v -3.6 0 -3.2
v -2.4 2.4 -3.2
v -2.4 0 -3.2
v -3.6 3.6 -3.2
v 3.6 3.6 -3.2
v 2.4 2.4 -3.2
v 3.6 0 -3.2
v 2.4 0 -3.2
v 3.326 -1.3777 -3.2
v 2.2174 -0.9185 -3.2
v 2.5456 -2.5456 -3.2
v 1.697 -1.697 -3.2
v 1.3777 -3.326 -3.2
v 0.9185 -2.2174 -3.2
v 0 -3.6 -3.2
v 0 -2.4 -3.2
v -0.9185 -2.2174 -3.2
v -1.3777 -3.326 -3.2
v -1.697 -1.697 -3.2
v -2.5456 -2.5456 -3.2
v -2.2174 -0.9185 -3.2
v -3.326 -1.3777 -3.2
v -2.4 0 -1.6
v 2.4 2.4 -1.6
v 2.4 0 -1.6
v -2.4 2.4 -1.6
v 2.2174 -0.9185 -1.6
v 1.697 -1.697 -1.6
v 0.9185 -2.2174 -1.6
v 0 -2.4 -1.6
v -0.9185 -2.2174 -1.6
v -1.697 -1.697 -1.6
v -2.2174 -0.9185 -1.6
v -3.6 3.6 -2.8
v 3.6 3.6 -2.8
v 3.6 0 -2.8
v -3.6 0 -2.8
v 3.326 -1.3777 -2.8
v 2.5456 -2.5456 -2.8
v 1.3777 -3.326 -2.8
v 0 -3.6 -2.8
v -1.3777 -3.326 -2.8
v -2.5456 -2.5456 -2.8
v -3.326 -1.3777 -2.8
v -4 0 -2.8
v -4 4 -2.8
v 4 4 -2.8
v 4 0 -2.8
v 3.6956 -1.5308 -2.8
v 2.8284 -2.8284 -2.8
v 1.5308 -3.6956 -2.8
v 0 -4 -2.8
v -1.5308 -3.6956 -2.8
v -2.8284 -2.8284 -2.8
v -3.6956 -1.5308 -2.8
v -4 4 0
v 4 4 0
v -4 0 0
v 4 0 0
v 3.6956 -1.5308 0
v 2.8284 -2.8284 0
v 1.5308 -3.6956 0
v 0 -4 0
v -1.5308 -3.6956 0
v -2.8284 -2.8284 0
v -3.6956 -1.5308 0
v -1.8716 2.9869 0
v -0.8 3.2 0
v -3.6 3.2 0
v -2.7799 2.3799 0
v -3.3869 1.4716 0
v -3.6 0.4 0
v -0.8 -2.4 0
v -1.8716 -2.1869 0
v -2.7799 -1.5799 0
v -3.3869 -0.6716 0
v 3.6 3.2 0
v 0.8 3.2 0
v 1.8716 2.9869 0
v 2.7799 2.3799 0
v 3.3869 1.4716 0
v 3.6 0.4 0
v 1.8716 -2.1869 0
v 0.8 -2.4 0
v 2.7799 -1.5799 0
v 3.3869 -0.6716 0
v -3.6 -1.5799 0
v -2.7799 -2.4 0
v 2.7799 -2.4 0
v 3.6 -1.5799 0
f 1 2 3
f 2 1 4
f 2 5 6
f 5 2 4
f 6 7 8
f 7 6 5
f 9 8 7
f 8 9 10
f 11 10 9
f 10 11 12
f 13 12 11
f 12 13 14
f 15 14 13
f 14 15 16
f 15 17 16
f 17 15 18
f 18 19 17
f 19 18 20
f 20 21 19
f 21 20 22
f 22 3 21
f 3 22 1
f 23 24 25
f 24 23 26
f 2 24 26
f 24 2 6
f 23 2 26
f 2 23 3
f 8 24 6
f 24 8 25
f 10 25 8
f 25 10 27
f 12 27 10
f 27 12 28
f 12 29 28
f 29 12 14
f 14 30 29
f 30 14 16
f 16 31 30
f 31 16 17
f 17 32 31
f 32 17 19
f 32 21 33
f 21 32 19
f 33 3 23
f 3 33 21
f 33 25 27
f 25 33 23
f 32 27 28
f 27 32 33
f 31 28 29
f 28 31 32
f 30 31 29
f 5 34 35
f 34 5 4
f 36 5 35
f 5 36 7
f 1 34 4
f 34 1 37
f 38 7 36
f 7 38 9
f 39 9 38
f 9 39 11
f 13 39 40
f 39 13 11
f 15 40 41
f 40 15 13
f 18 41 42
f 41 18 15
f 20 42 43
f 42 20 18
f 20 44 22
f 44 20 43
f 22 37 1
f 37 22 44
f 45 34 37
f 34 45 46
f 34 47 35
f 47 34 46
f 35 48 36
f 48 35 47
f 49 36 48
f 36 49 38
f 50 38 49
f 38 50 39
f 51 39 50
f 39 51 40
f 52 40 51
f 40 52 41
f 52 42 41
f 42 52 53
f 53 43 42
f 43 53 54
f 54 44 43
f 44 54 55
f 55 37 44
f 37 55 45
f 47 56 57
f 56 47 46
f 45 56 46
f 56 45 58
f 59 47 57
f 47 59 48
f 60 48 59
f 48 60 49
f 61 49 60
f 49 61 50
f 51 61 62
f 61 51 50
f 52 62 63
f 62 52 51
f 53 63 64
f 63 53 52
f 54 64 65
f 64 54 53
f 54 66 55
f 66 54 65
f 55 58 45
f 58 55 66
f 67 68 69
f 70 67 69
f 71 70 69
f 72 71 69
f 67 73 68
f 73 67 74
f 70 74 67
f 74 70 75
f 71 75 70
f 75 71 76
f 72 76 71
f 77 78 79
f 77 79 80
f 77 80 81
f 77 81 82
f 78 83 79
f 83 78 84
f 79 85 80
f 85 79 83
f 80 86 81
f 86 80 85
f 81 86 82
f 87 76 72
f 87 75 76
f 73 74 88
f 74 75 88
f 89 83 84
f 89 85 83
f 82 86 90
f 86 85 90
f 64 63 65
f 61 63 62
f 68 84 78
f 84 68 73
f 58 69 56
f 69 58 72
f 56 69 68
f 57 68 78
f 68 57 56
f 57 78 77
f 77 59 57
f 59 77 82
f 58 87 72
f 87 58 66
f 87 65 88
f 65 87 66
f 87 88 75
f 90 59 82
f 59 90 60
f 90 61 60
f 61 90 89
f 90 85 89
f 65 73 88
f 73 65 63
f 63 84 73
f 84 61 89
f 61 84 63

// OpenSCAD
// file: ../p/2-4edge.scad
use <../lib.scad>
function ldraw_lib__2_4edge() = [
// 0 Circle 0.5
// 0 Name: 2-4edge.dat
// 0 Author: James Jessiman
// 0 !LDRAW_ORG Primitive UPDATE 2017-01
// 0 !LICENSE Licensed under CC BY 4.0 : see CAreadme.txt
// 
// 0 BFC CERTIFY CCW
  [0,"BFC","CERTIFY"],
  [0,"BFC","CCW"],
// 
// 0 !HISTORY 2007-06-24 [PTadmin] Header formatted for Contributor Agreement
// 0 !HISTORY 2008-07-01 [PTadmin] Official Update 2008-01
// 0 !HISTORY 2017-01-15 [Steffen] BFCed
// 0 !HISTORY 2017-12-30 [PTadmin] Official Update 2017-01
// 
// 
// 2 24 1 0 0 0.9239 0 0.3827
  [2,24,1,0,0,0.9239,0,0.3827],
// 2 24 0.9239 0 0.3827 0.7071 0 0.7071
  [2,24,0.9239,0,0.3827,0.7071,0,0.7071],
// 2 24 0.7071 0 0.7071 0.3827 0 0.9239
  [2,24,0.7071,0,0.7071,0.3827,0,0.9239],
// 2 24 0.3827 0 0.9239 0 0 1
  [2,24,0.3827,0,0.9239,0,0,1],
// 2 24 0 0 1 -0.3827 0 0.9239
  [2,24,0,0,1,-0.3827,0,0.9239],
// 2 24 -0.3827 0 0.9239 -0.7071 0 0.7071
  [2,24,-0.3827,0,0.9239,-0.7071,0,0.7071],
// 2 24 -0.7071 0 0.7071 -0.9239 0 0.3827
  [2,24,-0.7071,0,0.7071,-0.9239,0,0.3827],
// 2 24 -0.9239 0 0.3827 -1 0 0
  [2,24,-0.9239,0,0.3827,-1,0,0],
];
module ldraw_lib__2_4edge(step=0, col=false, unit=2/5, alt=false, line=0.2, solid=!$preview)
    makepoly(ldraw_lib__2_4edge(), step=step, col=col, unit=unit, alt=alt, line=line, solid=solid);
ldraw_lib__2_4edge(line=0.2);
// file: ../p/2-4cyli.scad
use <../lib.scad>
function ldraw_lib__2_4cyli() = [
// 0 Cylinder 0.5
// 0 Name: 2-4cyli.dat
// 0 Author: James Jessiman
// 0 !LDRAW_ORG Primitive UPDATE 2005-01
// 0 !LICENSE Licensed under CC BY 4.0 : see CAreadme.txt
// 
// 0 BFC CERTIFY CCW
  [0,"BFC","CERTIFY"],
  [0,"BFC","CCW"],
// 
// 0 !HISTORY 2002-03-23 [sbliss] Added BFC statement; compacted code
// 0 !HISTORY 2002-04-25 [PTadmin] Official Update 2002-02
// 0 !HISTORY 2004-12-11 [nielsk] Recreated using Primitive Generator, Edge lines fixed, BFC changed to CCW
// 0 !HISTORY 2005-12-28 [PTadmin] Official Update 2005-01
// 0 !HISTORY 2007-06-24 [PTadmin] Header formatted for Contributor Agreement
// 0 !HISTORY 2008-07-01 [PTadmin] Official Update 2008-01
// 
// 
// 4 16 .9239 1 .3827 .9239 0 .3827 1 0 0 1 1 0
  [4,16,.9239,1,.3827,.9239,0,.3827,1,0,0,1,1,0],
// 4 16 .7071 1 .7071 .7071 0 .7071 .9239 0 .3827 .9239 1 .3827
  [4,16,.7071,1,.7071,.7071,0,.7071,.9239,0,.3827,.9239,1,.3827],
// 4 16 .3827 1 .9239 .3827 0 .9239 .7071 0 .7071 .7071 1 .7071
  [4,16,.3827,1,.9239,.3827,0,.9239,.7071,0,.7071,.7071,1,.7071],
// 4 16 0 1 1 0 0 1 .3827 0 .9239 .3827 1 .9239
  [4,16,0,1,1,0,0,1,.3827,0,.9239,.3827,1,.9239],
// 4 16 -.3827 1 .9239 -.3827 0 .9239 0 0 1 0 1 1
  [4,16,-.3827,1,.9239,-.3827,0,.9239,0,0,1,0,1,1],
// 4 16 -.7071 1 .7071 -.7071 0 .7071 -.3827 0 .9239 -.3827 1 .9239
  [4,16,-.7071,1,.7071,-.7071,0,.7071,-.3827,0,.9239,-.3827,1,.9239],
// 4 16 -.9239 1 .3827 -.9239 0 .3827 -.7071 0 .7071 -.7071 1 .7071
  [4,16,-.9239,1,.3827,-.9239,0,.3827,-.7071,0,.7071,-.7071,1,.7071],
// 4 16 -1 1 0 -1 0 0 -.9239 0 .3827 -.9239 1 .3827
  [4,16,-1,1,0,-1,0,0,-.9239,0,.3827,-.9239,1,.3827],
// 5 24 1 1 0 1 0 0 1 1 -.4142 .9239 1 .3827
  [5,24,1,1,0,1,0,0,1,1,-.4142,.9239,1,.3827],
// 5 24 .9239 1 .3827 .9239 0 .3827 1 1 0 .7071 1 .7071
  [5,24,.9239,1,.3827,.9239,0,.3827,1,1,0,.7071,1,.7071],
// 5 24 .7071 1 .7071 .7071 0 .7071 .9239 1 .3827 .3827 1 .9239
  [5,24,.7071,1,.7071,.7071,0,.7071,.9239,1,.3827,.3827,1,.9239],
// 5 24 .3827 1 .9239 .3827 0 .9239 .7071 1 .7071 0 1 1
  [5,24,.3827,1,.9239,.3827,0,.9239,.7071,1,.7071,0,1,1],
// 5 24 0 1 1 0 0 1 .3827 1 .9239 -.3827 1 .9239
  [5,24,0,1,1,0,0,1,.3827,1,.9239,-.3827,1,.9239],
// 5 24 -.3827 1 .9239 -.3827 0 .9239 0 1 1 -.7071 1 .7071
  [5,24,-.3827,1,.9239,-.3827,0,.9239,0,1,1,-.7071,1,.7071],
// 5 24 -.7071 1 .7071 -.7071 0 .7071 -.3827 1 .9239 -.9239 1 .3827
  [5,24,-.7071,1,.7071,-.7071,0,.7071,-.3827,1,.9239,-.9239,1,.3827],
// 5 24 -.9239 1 .3827 -.9239 0 .3827 -.7071 1 .7071 -1 1 0
  [5,24,-.9239,1,.3827,-.9239,0,.3827,-.7071,1,.7071,-1,1,0],
// 5 24 -1 1 0 -1 0 0 -.9239 1 .3827 -1 1 -.4142
  [5,24,-1,1,0,-1,0,0,-.9239,1,.3827,-1,1,-.4142],
// 0
];
module ldraw_lib__2_4cyli(step=0, col=false, unit=2/5, alt=false, line=0.2, solid=!$preview)
    makepoly(ldraw_lib__2_4cyli(), step=step, col=col, unit=unit, alt=alt, line=line, solid=solid);
ldraw_lib__2_4cyli(line=0.2);
// file: ../p/empty.scad
use <../lib.scad>
function ldraw_lib__empty() = [
// 0 Empty
// 0 Name: empty.dat
// 0 Author: Steffen [Steffen]
// 0 !LDRAW_ORG Primitive UPDATE 2025-08
// 0 !LICENSE Licensed under CC BY 4.0 : see CAreadme.txt
// 
// 0 BFC CERTIFY CCW
  [0,"BFC","CERTIFY"],
  [0,"BFC","CCW"],
// 
// 0 !HISTORY 2015-10-11 [PTadmin] Official Update 2015-01
// 0 !HISTORY 2025-08-13 [OrionP] Fix comments
// 0 !HISTORY 2025-08-31 [OrionP] Official Update 2025-08
// 
// 0 // Tool MLCad cannot handle really empty files. This file is used as a workaround.
// 0 // It exceptionally contains forbidden non-LDRAW standard syntax to satisfy MLCad
// 0 // until it is fixed OR a different editor has become the de-facto LDRAW standard.
// 0 // The line being used here is an "impossible" conditional line which never should be visible,
// 0 // additionally hidden by a syntax explicitly hiding it from displaying.
// 
// 0 MLCAD HIDE 5 24 0 0 0 0.0001 0 0 0.0001 -0.0001 0 0 0 0
];
module ldraw_lib__empty(step=0, col=false, unit=2/5, alt=false, line=0.2, solid=!$preview)
    makepoly(ldraw_lib__empty(), step=step, col=col, unit=unit, alt=alt, line=line, solid=solid);
ldraw_lib__empty(line=0.2);
// file: ../p/box4-4a.scad
use <../lib.scad>
function ldraw_lib__box4_4a() = [
// 0 Box with  4 Faces without  4 Adjacent Edges
// 0 Name: box4-4a.dat
// 0 Author: Willy Tschager [Holly-Wood]
// 0 !LDRAW_ORG Primitive UPDATE 2024-01
// 0 !LICENSE Licensed under CC BY 4.0 : see CAreadme.txt
// 
// 0 BFC CERTIFY CCW
  [0,"BFC","CERTIFY"],
  [0,"BFC","CCW"],
// 
// 0 !HISTORY 1998-07-15 [PTadmin] Official Update 1998-07
// 0 !HISTORY 2002-12-13 [hafhead] Made BFC compliant
// 0 !HISTORY 2003-03-12 [PTadmin] Official Update 2003-01
// 0 !HISTORY 2007-06-24 [PTadmin] Header formatted for Contributor Agreement
// 0 !HISTORY 2008-07-01 [PTadmin] Official Update 2008-01
// 0 !HISTORY 2012-02-16 [Philo] Changed to CCW
// 0 !HISTORY 2012-03-30 [PTadmin] Official Update 2012-01
// 0 !HISTORY 2024-01-03 [Holly-Wood] Complete re-write, original by Manfred Moolhuysen
// 0 !HISTORY 2024-01-29 [OrionP] Official Update 2024-01
// 
// 2 24 -1 1 -1 -1 1 1
  [2,24,-1,1,-1,-1,1,1],
// 2 24 1 1 1 1 1 -1
  [2,24,1,1,1,1,1,-1],
// 2 24 -1 1 1 1 1 1
  [2,24,-1,1,1,1,1,1],
// 4 16 1 1 1 1 1 -1 -1 1 -1 -1 1 1
  [4,16,1,1,1,1,1,-1,-1,1,-1,-1,1,1],
// 
// 2 24 -1 0 -1 -1 0 1
  [2,24,-1,0,-1,-1,0,1],
// 4 16 -1 1 1 -1 1 -1 -1 0 -1 -1 0 1
  [4,16,-1,1,1,-1,1,-1,-1,0,-1,-1,0,1],
// 
// 2 24 1 0 1 1 0 -1
  [2,24,1,0,1,1,0,-1],
// 4 16 1 1 -1 1 1 1 1 0 1 1 0 -1
  [4,16,1,1,-1,1,1,1,1,0,1,1,0,-1],
// 
// 2 24 1 1 1 1 0 1
  [2,24,1,1,1,1,0,1],
// 2 24 -1 1 1 -1 0 1
  [2,24,-1,1,1,-1,0,1],
// 2 24 -1 0 1 1 0 1
  [2,24,-1,0,1,1,0,1],
// 4 16 1 1 1 -1 1 1 -1 0 1 1 0 1
  [4,16,1,1,1,-1,1,1,-1,0,1,1,0,1],
];
module ldraw_lib__box4_4a(step=0, col=false, unit=2/5, alt=false, line=0.2, solid=!$preview)
    makepoly(ldraw_lib__box4_4a(), step=step, col=col, unit=unit, alt=alt, line=line, solid=solid);
ldraw_lib__box4_4a(line=0.2);
// file: ../p/box3u4a.scad
use <../lib.scad>
function ldraw_lib__box3u4a() = [
// 0 Box with 3 Faces without 4 Adjacent Edges
// 0 Name: box3u4a.dat
// 0 Author: Niels Karsdorp [nielsk]
// 0 !LDRAW_ORG Primitive UPDATE 2009-01
// 0 !LICENSE Licensed under CC BY 4.0 : see CAreadme.txt
// 
// 0 BFC CERTIFY CCW
  [0,"BFC","CERTIFY"],
  [0,"BFC","CCW"],
// 
// 0 !HISTORY 2009-05-02 [PTadmin] Official Update 2009-01
// 
// 
// 2 24 1 1 1 -1 1 1
  [2,24,1,1,1,-1,1,1],
// 2 24 -1 1 -1 1 1 -1
  [2,24,-1,1,-1,1,1,-1],
// 2 24 1 1 1 1 1 -1
  [2,24,1,1,1,1,1,-1],
// 2 24 -1 1 1 -1 1 -1
  [2,24,-1,1,1,-1,1,-1],
// 2 24 1 1 1 1 0 1
  [2,24,1,1,1,1,0,1],
// 2 24 1 1 -1 1 0 -1
  [2,24,1,1,-1,1,0,-1],
// 2 24 -1 1 1 -1 0 1
  [2,24,-1,1,1,-1,0,1],
// 2 24 -1 1 -1 -1 0 -1
  [2,24,-1,1,-1,-1,0,-1],
// 4 16 -1 1 -1 -1 1 1 1 1 1 1 1 -1
  [4,16,-1,1,-1,-1,1,1,1,1,1,1,1,-1],
// 4 16 -1 1 1 -1 0 1 1 0 1 1 1 1
  [4,16,-1,1,1,-1,0,1,1,0,1,1,1,1],
// 4 16 1 1 -1 1 0 -1 -1 0 -1 -1 1 -1
  [4,16,1,1,-1,1,0,-1,-1,0,-1,-1,1,-1],
// 0
];
module ldraw_lib__box3u4a(step=0, col=false, unit=2/5, alt=false, line=0.2, solid=!$preview)
    makepoly(ldraw_lib__box3u4a(), step=step, col=col, unit=unit, alt=alt, line=line, solid=solid);
ldraw_lib__box3u4a(line=0.2);
// file: ../p/2-4ring9.scad
use <../lib.scad>
function ldraw_lib__2_4ring9() = [
// 0 Ring  9 x 0.5
// 0 Name: 2-4ring9.dat
// 0 Author: Willy Tschager [Holly-Wood]
// 0 !LDRAW_ORG Primitive UPDATE 2024-01
// 0 !LICENSE Licensed under CC BY 4.0 : see CAreadme.txt
// 
// 0 BFC CERTIFY CCW
  [0,"BFC","CERTIFY"],
  [0,"BFC","CCW"],
// 
// 0 !HISTORY 2009-09-03 [PTadmin] Official Update 2009-02
// 0 !HISTORY 2024-01-10 [Holly-Wood] Complete regeneration, original by guyvivan
// 0 !HISTORY 2024-01-29 [OrionP] Official Update 2024-01
// 
// 4 16 10 0 0 9.239 0 3.827 8.3151 0 3.4443 9 0 0
  [4,16,10,0,0,9.239,0,3.827,8.3151,0,3.4443,9,0,0],
// 4 16 9.239 0 3.827 7.071 0 7.071 6.3639 0 6.3639 8.3151 0 3.4443
  [4,16,9.239,0,3.827,7.071,0,7.071,6.3639,0,6.3639,8.3151,0,3.4443],
// 4 16 7.071 0 7.071 3.827 0 9.239 3.4443 0 8.3151 6.3639 0 6.3639
  [4,16,7.071,0,7.071,3.827,0,9.239,3.4443,0,8.3151,6.3639,0,6.3639],
// 4 16 3.827 0 9.239 0 0 10 0 0 9 3.4443 0 8.3151
  [4,16,3.827,0,9.239,0,0,10,0,0,9,3.4443,0,8.3151],
// 4 16 0 0 10 -3.827 0 9.239 -3.4443 0 8.3151 0 0 9
  [4,16,0,0,10,-3.827,0,9.239,-3.4443,0,8.3151,0,0,9],
// 4 16 -3.827 0 9.239 -7.071 0 7.071 -6.3639 0 6.3639 -3.4443 0 8.3151
  [4,16,-3.827,0,9.239,-7.071,0,7.071,-6.3639,0,6.3639,-3.4443,0,8.3151],
// 4 16 -7.071 0 7.071 -9.239 0 3.827 -8.3151 0 3.4443 -6.3639 0 6.3639
  [4,16,-7.071,0,7.071,-9.239,0,3.827,-8.3151,0,3.4443,-6.3639,0,6.3639],
// 4 16 -9.239 0 3.827 -10 0 0 -9 0 0 -8.3151 0 3.4443
  [4,16,-9.239,0,3.827,-10,0,0,-9,0,0,-8.3151,0,3.4443],
// 0 // Build by LDPartEditor (PrimGen 2.X)
];
module ldraw_lib__2_4ring9(step=0, col=false, unit=2/5, alt=false, line=0.2, solid=!$preview)
    makepoly(ldraw_lib__2_4ring9(), step=step, col=col, unit=unit, alt=alt, line=line, solid=solid);
ldraw_lib__2_4ring9(line=0.2);
// file: ../p/2-4ring2.scad
use <../lib.scad>
function ldraw_lib__2_4ring2() = [
// 0 Ring  2 x 0.5
// 0 Name: 2-4ring2.dat
// 0 Author: Chris Dee [cwdee]
// 0 !LDRAW_ORG Primitive UPDATE 2012-01
// 0 !LICENSE Licensed under CC BY 4.0 : see CAreadme.txt
// 
// 0 BFC CERTIFY CCW
  [0,"BFC","CERTIFY"],
  [0,"BFC","CCW"],
// 
// 0 !HISTORY 2001-10-26 [PTadmin] Official Update 2001-01
// 0 !HISTORY 2007-06-24 [PTadmin] Header formatted for Contributor Agreement
// 0 !HISTORY 2008-07-01 [PTadmin] Official Update 2008-01
// 0 !HISTORY 2012-02-16 [Philo] Changed to CCW
// 0 !HISTORY 2012-03-30 [PTadmin] Official Update 2012-01
// 
// 
// 4 16 3 0 0 2.7717 0 1.1481 1.8478 0 0.7654 2 0 0
  [4,16,3,0,0,2.7717,0,1.1481,1.8478,0,0.7654,2,0,0],
// 4 16 2.7717 0 1.1481 2.1213 0 2.1213 1.4142 0 1.4142 1.8478 0 0.7654
  [4,16,2.7717,0,1.1481,2.1213,0,2.1213,1.4142,0,1.4142,1.8478,0,0.7654],
// 4 16 2.1213 0 2.1213 1.1481 0 2.7717 0.7654 0 1.8478 1.4142 0 1.4142
  [4,16,2.1213,0,2.1213,1.1481,0,2.7717,0.7654,0,1.8478,1.4142,0,1.4142],
// 4 16 1.1481 0 2.7717 0 0 3 0 0 2 0.7654 0 1.8478
  [4,16,1.1481,0,2.7717,0,0,3,0,0,2,0.7654,0,1.8478],
// 4 16 0 0 3 -1.1481 0 2.7717 -0.7654 0 1.8478 0 0 2
  [4,16,0,0,3,-1.1481,0,2.7717,-0.7654,0,1.8478,0,0,2],
// 4 16 -1.1481 0 2.7717 -2.1213 0 2.1213 -1.4142 0 1.4142 -0.7654 0 1.8478
  [4,16,-1.1481,0,2.7717,-2.1213,0,2.1213,-1.4142,0,1.4142,-0.7654,0,1.8478],
// 4 16 -2.1213 0 2.1213 -2.7717 0 1.1481 -1.8478 0 0.7654 -1.4142 0 1.4142
  [4,16,-2.1213,0,2.1213,-2.7717,0,1.1481,-1.8478,0,0.7654,-1.4142,0,1.4142],
// 4 16 -2.7717 0 1.1481 -3 0 0 -2 0 0 -1.8478 0 0.7654
  [4,16,-2.7717,0,1.1481,-3,0,0,-2,0,0,-1.8478,0,0.7654],
];
module ldraw_lib__2_4ring2(step=0, col=false, unit=2/5, alt=false, line=0.2, solid=!$preview)
    makepoly(ldraw_lib__2_4ring2(), step=step, col=col, unit=unit, alt=alt, line=line, solid=solid);
ldraw_lib__2_4ring2(line=0.2);
// file: ../p/2-4cylo.scad
use <../lib.scad>
use <2-4cyli.scad>
use <2-4edge.scad>
function ldraw_lib__2_4cylo() = [
// 0 Cylinder Open 0.5
// 0 Name: 2-4cylo.dat
// 0 Author: Max Martin Richter [MMR1988]
// 0 !LDRAW_ORG Primitive UPDATE 2010-03
// 0 !LICENSE Licensed under CC BY 4.0 : see CAreadme.txt
// 
// 0 BFC CERTIFY CCW
  [0,"BFC","CERTIFY"],
  [0,"BFC","CCW"],
// 
// 0 !HISTORY 2010-12-31 [PTadmin] Official Update 2010-03
// 
// 
// 1 16 0 0 0 1 0 0 0 1 0 0 0 1 2-4edge.dat
  [1,16,0,0,0,1,0,0,0,1,0,0,0,1, ldraw_lib__2_4edge()],
// 1 16 0 1 0 1 0 0 0 1 0 0 0 1 2-4edge.dat
  [1,16,0,1,0,1,0,0,0,1,0,0,0,1, ldraw_lib__2_4edge()],
// 1 16 0 0 0 1 0 0 0 1 0 0 0 1 2-4cyli.dat
  [1,16,0,0,0,1,0,0,0,1,0,0,0,1, ldraw_lib__2_4cyli()],
];
module ldraw_lib__2_4cylo(step=0, col=false, unit=2/5, alt=false, line=0.2, solid=!$preview)
    makepoly(ldraw_lib__2_4cylo(), step=step, col=col, unit=unit, alt=alt, line=line, solid=solid);
ldraw_lib__2_4cylo(line=0.2);
// file: ../p/1-16chrd.scad
use <../lib.scad>
use <empty.scad>
function ldraw_lib__1_16chrd() = [
// 0 Chord 0.0625
// 0 Name: 1-16chrd.dat
// 0 Author: Philippe Hurbain [Philo]
// 0 !LDRAW_ORG Primitive UPDATE 2015-01
// 0 !LICENSE Licensed under CC BY 4.0 : see CAreadme.txt
// 
// 0 BFC CERTIFY CCW
  [0,"BFC","CERTIFY"],
  [0,"BFC","CCW"],
// 
// 0 !HISTORY 2015-10-11 [PTadmin] Official Update 2015-01
// 
// 
// 0 // This file is intentionally empty because at the current \P resolution,
// 0 // an 1-16chrd is actually empty. However, this file still is present
// 0 // to allow tools to do primitives substition and fill in a real chrd here,
// 0 // or, if desired, to substitute this with the hi-res 48\1-16chrd.
// 
// 0 // This file is based on an idea by Darats at http://forums.ldraw.org/read.php?19,14500,14500#msg-14500
// 
// 1 16 0 0 0 1 0 0 0 1 0 0 0 1 empty.dat
  [1,16,0,0,0,1,0,0,0,1,0,0,0,1, ldraw_lib__empty()],
];
module ldraw_lib__1_16chrd(step=0, col=false, unit=2/5, alt=false, line=0.2, solid=!$preview)
    makepoly(ldraw_lib__1_16chrd(), step=step, col=col, unit=unit, alt=alt, line=line, solid=solid);
ldraw_lib__1_16chrd(line=0.2);
// file: s/24246s02.scad
use <../../lib.scad>
use <../../p/2-4chrd.scad>
use <../../p/2-4cylo.scad>
use <../../p/2-4ring2.scad>
use <../../p/2-4ring9.scad>
use <../../p/box3u4a.scad>
use <../../p/box4-4a.scad>
function ldraw_lib__s__24246s02() = [
// 0 ~Tile  1 x  1 with Rounded End without Complete Top Face
// 0 Name: s\24246s02.dat
// 0 Author: Magnus Forsberg [MagFors]
// 0 !LDRAW_ORG Subpart UPDATE 2020-02
// 0 !LICENSE Licensed under CC BY 4.0 : see CAreadme.txt
// 
// 0 BFC CERTIFY CCW
  [0,"BFC","CERTIFY"],
  [0,"BFC","CCW"],
// 
// 0 !HISTORY 2020-09-05 [PTadmin] Official Update 2020-02
// 
// 
// 4 16 -9 8 0 -9 8 9 -6 8 6 -6 8 0
  [4,16,-9,8,0,-9,8,9,-6,8,6,-6,8,0],
// 4 16 -9 8 9 9 8 9 6 8 6 -6 8 6
  [4,16,-9,8,9,9,8,9,6,8,6,-6,8,6],
// 4 16 9 8 9 9 8 0 6 8 0 6 8 6
  [4,16,9,8,9,9,8,0,6,8,0,6,8,6],
// 1 16 0 8 0 3 0 0 0 -1 0 0 0 -3 2-4ring2.dat
  [1,16,0,8,0,3,0,0,0,-1,0,0,0,-3, ldraw_lib__2_4ring2()],
// 0 BFC INVERTNEXT
  [0,"BFC","INVERTNEXT"],
// 1 16 0 8 3 6 0 0 0 -4 0 0 0 3 box4-4a.dat
  [1,16,0,8,3,6,0,0,0,-4,0,0,0,3, ldraw_lib__box4_4a()],
// 0 BFC INVERTNEXT
  [0,"BFC","INVERTNEXT"],
// 1 16 0 4 0 6 0 0 0 4 0 0 0 -6 2-4cylo.dat
  [1,16,0,4,0,6,0,0,0,4,0,0,0,-6, ldraw_lib__2_4cylo()],
// 1 16 0 4 0 6 0 0 0 -4 0 0 0 -6 2-4chrd.dat
  [1,16,0,4,0,6,0,0,0,-4,0,0,0,-6, ldraw_lib__2_4chrd()],
// 1 16 0 7.5 0 0 0 9 0.5 0 0 0 9 0 box3u4a.dat
  [1,16,0,7.5,0,0,0,9,0.5,0,0,0,9,0, ldraw_lib__box3u4a()],
// 1 16 0 7 0 9 0 0 0 1 0 0 0 -9 2-4cylo.dat
  [1,16,0,7,0,9,0,0,0,1,0,0,0,-9, ldraw_lib__2_4cylo()],
// 4 16 -10 7 0 -10 7 10 -9 7 9 -9 7 0
  [4,16,-10,7,0,-10,7,10,-9,7,9,-9,7,0],
// 4 16 -10 7 10 10 7 10 9 7 9 -9 7 9
  [4,16,-10,7,10,10,7,10,9,7,9,-9,7,9],
// 4 16 10 7 10 10 7 0 9 7 0 9 7 9
  [4,16,10,7,10,10,7,0,9,7,0,9,7,9],
// 1 16 0 7 0 1 0 0 0 -1 0 0 0 -1 2-4ring9.dat
  [1,16,0,7,0,1,0,0,0,-1,0,0,0,-1, ldraw_lib__2_4ring9()],
// 1 16 0 3.5 0 0 0 -10 -3.5 0 0 0 10 0 box3u4a.dat
  [1,16,0,3.5,0,0,0,-10,-3.5,0,0,0,10,0, ldraw_lib__box3u4a()],
// 1 16 0 0 0 10 0 0 0 7 0 0 0 -10 2-4cylo.dat
  [1,16,0,0,0,10,0,0,0,7,0,0,0,-10, ldraw_lib__2_4cylo()],
];
module ldraw_lib__s__24246s02(step=0, col=false, unit=2/5, alt=false, line=0.2, solid=!$preview)
    makepoly(ldraw_lib__s__24246s02(), step=step, col=col, unit=unit, alt=alt, line=line, solid=solid);
ldraw_lib__s__24246s02(line=0.2);
// file: ../p/2-4chrd.scad
use <../lib.scad>
function ldraw_lib__2_4chrd() = [
// 0 Chord 0.5
// 0 Name: 2-4chrd.dat
// 0 Author: Philippe Hurbain [Philo]
// 0 !LDRAW_ORG Primitive UPDATE 2014-01
// 0 !LICENSE Licensed under CC BY 4.0 : see CAreadme.txt
// 
// 0 BFC CERTIFY CCW
  [0,"BFC","CERTIFY"],
  [0,"BFC","CCW"],
// 
// 0 !HISTORY 2014-06-21 [PTadmin] Official Update 2014-01
// 
// 
// 4 16 0.9239 0 0.3827 -0.9239 0 0.3827 -1 0 0 1 0 0
  [4,16,0.9239,0,0.3827,-0.9239,0,0.3827,-1,0,0,1,0,0],
// 4 16 0.7071 0 0.7071 -0.7071 0 0.7071 -0.9239 0 0.3827 0.9239 0 0.3827
  [4,16,0.7071,0,0.7071,-0.7071,0,0.7071,-0.9239,0,0.3827,0.9239,0,0.3827],
// 4 16 0.3827 0 0.9239 -0.3827 0 0.9239 -0.7071 0 0.7071 0.7071 0 0.7071
  [4,16,0.3827,0,0.9239,-0.3827,0,0.9239,-0.7071,0,0.7071,0.7071,0,0.7071],
// 3 16 0 0 1 -0.3827 0 0.9239 0.3827 0 0.9239
  [3,16,0,0,1,-0.3827,0,0.9239,0.3827,0,0.9239],
];
module ldraw_lib__2_4chrd(step=0, col=false, unit=2/5, alt=false, line=0.2, solid=!$preview)
    makepoly(ldraw_lib__2_4chrd(), step=step, col=col, unit=unit, alt=alt, line=line, solid=solid);
ldraw_lib__2_4chrd(line=0.2);
// file: ../p/1-8tndis.scad
use <../lib.scad>
function ldraw_lib__1_8tndis() = [
// 0 Disc Negative Truncated 0.125
// 0 Name: 1-8tndis.dat
// 0 Author: Massimo Maso [Sirio]
// 0 !LDRAW_ORG Primitive UPDATE 2022-02
// 0 !LICENSE Licensed under CC BY 4.0 : see CAreadme.txt
// 
// 0 BFC CERTIFY CCW
  [0,"BFC","CERTIFY"],
  [0,"BFC","CCW"],
// 
// 0 !HISTORY 2022-03-06 [PTadmin] Official Update 2022-02
// 
// 
// 3 16 1 0 .7071 .9239 0 .3827 1 0 0
  [3,16,1,0,.7071,.9239,0,.3827,1,0,0],
// 3 16 1 0 .7071 .7071 0 .7071 .9239 0 .3827
  [3,16,1,0,.7071,.7071,0,.7071,.9239,0,.3827],
];
module ldraw_lib__1_8tndis(step=0, col=false, unit=2/5, alt=false, line=0.2, solid=!$preview)
    makepoly(ldraw_lib__1_8tndis(), step=step, col=col, unit=unit, alt=alt, line=line, solid=solid);
ldraw_lib__1_8tndis(line=0.2);
// file: ../p/1-8ering.scad
use <../lib.scad>
use <1-16chrd.scad>
function ldraw_lib__1_8ering() = [
// 0 Adapter Ring Triangles to Normal 0.125
// 0 Name: 1-8ering.dat
// 0 Author: Gerald Lasser [GeraldLasser]
// 0 !LDRAW_ORG Primitive UPDATE 2020-01
// 0 !LICENSE Licensed under CC BY 4.0 : see CAreadme.txt
// 
// 0 BFC CERTIFY CCW
  [0,"BFC","CERTIFY"],
  [0,"BFC","CCW"],
// 
// 0 !HISTORY 2020-06-28 [PTadmin] Official Update 2020-01
// 
// 
// 0 // This file uses 1-16chrd (actually empty). It allows
// 0 // tools to do primitives substition and fill in a ring of chrd here,
// 0 // or, if desired, to substitute this with the hi-res 48\1-16chrd.
// 0 // This file is based on an idea by Darats at http://forums.ldraw.org/read.php?19,14500,14500#msg-14500
// 
// 1 16 0 0 0 1 0 0 0 1 0 0 0 1 1-16chrd.dat
  [1,16,0,0,0,1,0,0,0,1,0,0,0,1, ldraw_lib__1_16chrd()],
// 1 16 0 0 0 0.92388 0 -0.38268 0 1 0 0.38268 0 0.92388 1-16chrd.dat
  [1,16,0,0,0,0.92388,0,-0.38268,0,1,0,0.38268,0,0.92388, ldraw_lib__1_16chrd()],
];
module ldraw_lib__1_8ering(step=0, col=false, unit=2/5, alt=false, line=0.2, solid=!$preview)
    makepoly(ldraw_lib__1_8ering(), step=step, col=col, unit=unit, alt=alt, line=line, solid=solid);
ldraw_lib__1_8ering(line=0.2);
// file: ../p/1-8chrd.scad
use <../lib.scad>
function ldraw_lib__1_8chrd() = [
// 0 Chord 0.125
// 0 Name: 1-8chrd.dat
// 0 Author: Orion Pobursky [OrionP]
// 0 !LDRAW_ORG Primitive UPDATE 2023-05
// 0 !LICENSE Licensed under CC BY 4.0 : see CAreadme.txt
// 
// 0 BFC CERTIFY CCW
  [0,"BFC","CERTIFY"],
  [0,"BFC","CCW"],
// 
// 0 !HISTORY 2004-04-22 [PTadmin] Official Update 2004-02
// 0 !HISTORY 2007-06-22 [PTadmin] Header formatted for Contributor Agreement
// 0 !HISTORY 2008-07-01 [PTadmin] Official Update 2008-01
// 0 !HISTORY 2023-10-27 [OrionP] Rebuilt with PrimGen2, original author westrate
// 0 !HISTORY 2023-10-31 [OrionP] Official Update 2023-05
// 
// 3 16 1 0 0 0.9239 0 0.3827 0.7071 0 0.7071
  [3,16,1,0,0,0.9239,0,0.3827,0.7071,0,0.7071],
];
module ldraw_lib__1_8chrd(step=0, col=false, unit=2/5, alt=false, line=0.2, solid=!$preview)
    makepoly(ldraw_lib__1_8chrd(), step=step, col=col, unit=unit, alt=alt, line=line, solid=solid);
ldraw_lib__1_8chrd(line=0.2);
// file: ../p/1-4ndis.scad
use <../lib.scad>
function ldraw_lib__1_4ndis() = [
// 0 Disc Negative 0.25
// 0 Name: 1-4ndis.dat
// 0 Author: James Jessiman
// 0 !LDRAW_ORG Primitive UPDATE 2012-01
// 0 !LICENSE Licensed under CC BY 4.0 : see CAreadme.txt
// 
// 0 BFC CERTIFY CCW
  [0,"BFC","CERTIFY"],
  [0,"BFC","CCW"],
// 
// 0 !HISTORY 2002-03-23 [sbliss] Added BFC Statement
// 0 !HISTORY 2002-04-25 [PTadmin] Official Update 2002-02
// 0 !HISTORY 2007-06-22 [PTadmin] Header formatted for Contributor Agreement
// 0 !HISTORY 2008-07-01 [PTadmin] Official Update 2008-01
// 0 !HISTORY 2012-02-16 [Philo] Changed to CCW
// 0 !HISTORY 2012-03-30 [PTadmin] Official Update 2012-01
// 
// 
// 3 16 0.9239 0 0.3827 1 0 0 1 0 1
  [3,16,0.9239,0,0.3827,1,0,0,1,0,1],
// 3 16 0.7071 0 0.7071 0.9239 0 0.3827 1 0 1
  [3,16,0.7071,0,0.7071,0.9239,0,0.3827,1,0,1],
// 3 16 0.3827 0 0.9239 0.7071 0 0.7071 1 0 1
  [3,16,0.3827,0,0.9239,0.7071,0,0.7071,1,0,1],
// 3 16 0 0 1 0.3827 0 0.9239 1 0 1
  [3,16,0,0,1,0.3827,0,0.9239,1,0,1],
];
module ldraw_lib__1_4ndis(step=0, col=false, unit=2/5, alt=false, line=0.2, solid=!$preview)
    makepoly(ldraw_lib__1_4ndis(), step=step, col=col, unit=unit, alt=alt, line=line, solid=solid);
ldraw_lib__1_4ndis(line=0.2);
// main file
use <../lib.scad>
use <../p/1-4ndis.scad>
use <../p/1-8chrd.scad>
use <../p/1-8ering.scad>
use <../p/1-8tndis.scad>
use <../p/2-4chrd.scad>
use <s/24246s02.scad>
function ldraw_lib__24246p0e() = [
// 0 Tile  1 x  1 with Rounded End with Black Oval Pattern
// 0 Name: 24246p0e.dat
// 0 Author: Massimo Maso [Sirio]
// 0 !LDRAW_ORG Part UPDATE 2025-11
// 0 !LICENSE Licensed under CC BY 4.0 : see CAreadme.txt
// 
// 0 BFC CERTIFY CCW
  [0,"BFC","CERTIFY"],
  [0,"BFC","CCW"],
// 
// 0 !KEYWORDS Airbox, Bricklink 24246pb056, Brickowl 152347, Brickset 112504, F1
// 0 !KEYWORDS Formula one, Inlet, Mercedes, race car, Rebrickable 24246pr0052
// 0 !KEYWORDS Set 66802, Set 77244, Set 77249, Speed Champions, Williams
// 
// 0 !HISTORY 2025-11-30 [OrionP] Official Update 2025-11
// 
// 0 // Subpart
// 1 16 0 0 0 1 0 0 0 1 0 0 0 1 s\24246s02.dat
  [1,16,0,0,0,1,0,0,0,1,0,0,0,1, ldraw_lib__s__24246s02()],
// 0 // Primitives
// 1 16 -2 0 1 0 0 -7 0 1 0 7 0 0 1-4ndis.dat
  [1,16,-2,0,1,0,0,-7,0,1,0,7,0,0, ldraw_lib__1_4ndis()],
// 1 0 -2 0 1 0 0 -7 0 1 0 7 0 0 2-4chrd.dat
  [1,0,-2,0,1,0,0,-7,0,1,0,7,0,0, ldraw_lib__2_4chrd()],
// 1 16 2 0 1 0 0 7 0 1 0 7 0 0 1-4ndis.dat
  [1,16,2,0,1,0,0,7,0,1,0,7,0,0, ldraw_lib__1_4ndis()],
// 1 0 2 0 1 0 0 7 0 1 0 7 0 0 2-4chrd.dat
  [1,0,2,0,1,0,0,7,0,1,0,7,0,0, ldraw_lib__2_4chrd()],
// 1 16 -2 0 1 -7 0 0 0 1 0 0 0 -7 1-8tndis.dat
  [1,16,-2,0,1,-7,0,0,0,1,0,0,0,-7, ldraw_lib__1_8tndis()],
// 1 16 -2 0 1 0 0 -7 0 1 0 -7 0 0 1-8tndis.dat
  [1,16,-2,0,1,0,0,-7,0,1,0,-7,0,0, ldraw_lib__1_8tndis()],
// 1 16 2 0 1 0 0 7 0 1 0 -7 0 0 1-8tndis.dat
  [1,16,2,0,1,0,0,7,0,1,0,-7,0,0, ldraw_lib__1_8tndis()],
// 1 16 2 0 1 7 0 0 0 1 0 0 0 -7 1-8tndis.dat
  [1,16,2,0,1,7,0,0,0,1,0,0,0,-7, ldraw_lib__1_8tndis()],
// 1 16 0 0 0 -10 0 0 0 1 0 0 0 -10 1-8ering.dat
  [1,16,0,0,0,-10,0,0,0,1,0,0,0,-10, ldraw_lib__1_8ering()],
// 1 16 0 0 0 0 0 -10 0 1 0 -10 0 0 1-8chrd.dat
  [1,16,0,0,0,0,0,-10,0,1,0,-10,0,0, ldraw_lib__1_8chrd()],
// 1 16 0 0 0 0 0 10 0 1 0 -10 0 0 1-8chrd.dat
  [1,16,0,0,0,0,0,10,0,1,0,-10,0,0, ldraw_lib__1_8chrd()],
// 1 16 0 0 0 10 0 0 0 1 0 0 0 -10 1-8ering.dat
  [1,16,0,0,0,10,0,0,0,1,0,0,0,-10, ldraw_lib__1_8ering()],
// 0 // Faces
// 0 // Black face
// 4 0 -2 0 8 -2 0 -6 2 0 -6 2 0 8
  [4,0,-2,0,8,-2,0,-6,2,0,-6,2,0,8],
// 0 // Neutral faces
// 4 16 -10 0 10 -10 0 0 -9 0 1 -9 0 8
  [4,16,-10,0,10,-10,0,0,-9,0,1,-9,0,8],
// 3 16 -10 0 10 -9 0 8 -2 0 8
  [3,16,-10,0,10,-9,0,8,-2,0,8],
// 4 16 -10 0 10 -2 0 8 2 0 8 10 0 10
  [4,16,-10,0,10,-2,0,8,2,0,8,10,0,10],
// 3 16 10 0 10 2 0 8 9 0 8
  [3,16,10,0,10,2,0,8,9,0,8],
// 4 16 10 0 10 9 0 8 9 0 1 10 0 0
  [4,16,10,0,10,9,0,8,9,0,1,10,0,0],
// 4 16 -9 0 -3.9497 -9 0 1 -10 0 0 -9.239 0 -3.827
  [4,16,-9,0,-3.9497,-9,0,1,-10,0,0,-9.239,0,-3.827],
// 4 16 -9 0 -3.9497 -9.239 0 -3.827 -7.071 0 -7.071 -6.9497 0 -6
  [4,16,-9,0,-3.9497,-9.239,0,-3.827,-7.071,0,-7.071,-6.9497,0,-6],
// 3 16 -9 0 -3.9497 -6.9497 0 -6 -6.9497 0 -3.9497
  [3,16,-9,0,-3.9497,-6.9497,0,-6,-6.9497,0,-3.9497],
// 4 16 9 0 -3.9497 9.239 0 -3.827 10 0 0 9 0 1
  [4,16,9,0,-3.9497,9.239,0,-3.827,10,0,0,9,0,1],
// 4 16 9 0 -3.9497 6.9497 0 -6 7.071 0 -7.071 9.239 0 -3.827
  [4,16,9,0,-3.9497,6.9497,0,-6,7.071,0,-7.071,9.239,0,-3.827],
// 3 16 9 0 -3.9497 6.9497 0 -3.9497 6.9497 0 -6
  [3,16,9,0,-3.9497,6.9497,0,-3.9497,6.9497,0,-6],
// 4 16 0 0 -10 -2 0 -6 -6.9497 0 -6 -7.071 0 -7.071
  [4,16,0,0,-10,-2,0,-6,-6.9497,0,-6,-7.071,0,-7.071],
// 3 16 0 0 -10 2 0 -6 -2 0 -6
  [3,16,0,0,-10,2,0,-6,-2,0,-6],
// 4 16 0 0 -10 7.071 0 -7.071 6.9497 0 -6 2 0 -6
  [4,16,0,0,-10,7.071,0,-7.071,6.9497,0,-6,2,0,-6],
];
module ldraw_lib__24246p0e(step=0, col=false, unit=2/5, alt=false, line=0.2, solid=!$preview)
    makepoly(ldraw_lib__24246p0e(), step=step, col=col, unit=unit, alt=alt, line=line, solid=solid);
ldraw_lib__24246p0e(line=0.2);
